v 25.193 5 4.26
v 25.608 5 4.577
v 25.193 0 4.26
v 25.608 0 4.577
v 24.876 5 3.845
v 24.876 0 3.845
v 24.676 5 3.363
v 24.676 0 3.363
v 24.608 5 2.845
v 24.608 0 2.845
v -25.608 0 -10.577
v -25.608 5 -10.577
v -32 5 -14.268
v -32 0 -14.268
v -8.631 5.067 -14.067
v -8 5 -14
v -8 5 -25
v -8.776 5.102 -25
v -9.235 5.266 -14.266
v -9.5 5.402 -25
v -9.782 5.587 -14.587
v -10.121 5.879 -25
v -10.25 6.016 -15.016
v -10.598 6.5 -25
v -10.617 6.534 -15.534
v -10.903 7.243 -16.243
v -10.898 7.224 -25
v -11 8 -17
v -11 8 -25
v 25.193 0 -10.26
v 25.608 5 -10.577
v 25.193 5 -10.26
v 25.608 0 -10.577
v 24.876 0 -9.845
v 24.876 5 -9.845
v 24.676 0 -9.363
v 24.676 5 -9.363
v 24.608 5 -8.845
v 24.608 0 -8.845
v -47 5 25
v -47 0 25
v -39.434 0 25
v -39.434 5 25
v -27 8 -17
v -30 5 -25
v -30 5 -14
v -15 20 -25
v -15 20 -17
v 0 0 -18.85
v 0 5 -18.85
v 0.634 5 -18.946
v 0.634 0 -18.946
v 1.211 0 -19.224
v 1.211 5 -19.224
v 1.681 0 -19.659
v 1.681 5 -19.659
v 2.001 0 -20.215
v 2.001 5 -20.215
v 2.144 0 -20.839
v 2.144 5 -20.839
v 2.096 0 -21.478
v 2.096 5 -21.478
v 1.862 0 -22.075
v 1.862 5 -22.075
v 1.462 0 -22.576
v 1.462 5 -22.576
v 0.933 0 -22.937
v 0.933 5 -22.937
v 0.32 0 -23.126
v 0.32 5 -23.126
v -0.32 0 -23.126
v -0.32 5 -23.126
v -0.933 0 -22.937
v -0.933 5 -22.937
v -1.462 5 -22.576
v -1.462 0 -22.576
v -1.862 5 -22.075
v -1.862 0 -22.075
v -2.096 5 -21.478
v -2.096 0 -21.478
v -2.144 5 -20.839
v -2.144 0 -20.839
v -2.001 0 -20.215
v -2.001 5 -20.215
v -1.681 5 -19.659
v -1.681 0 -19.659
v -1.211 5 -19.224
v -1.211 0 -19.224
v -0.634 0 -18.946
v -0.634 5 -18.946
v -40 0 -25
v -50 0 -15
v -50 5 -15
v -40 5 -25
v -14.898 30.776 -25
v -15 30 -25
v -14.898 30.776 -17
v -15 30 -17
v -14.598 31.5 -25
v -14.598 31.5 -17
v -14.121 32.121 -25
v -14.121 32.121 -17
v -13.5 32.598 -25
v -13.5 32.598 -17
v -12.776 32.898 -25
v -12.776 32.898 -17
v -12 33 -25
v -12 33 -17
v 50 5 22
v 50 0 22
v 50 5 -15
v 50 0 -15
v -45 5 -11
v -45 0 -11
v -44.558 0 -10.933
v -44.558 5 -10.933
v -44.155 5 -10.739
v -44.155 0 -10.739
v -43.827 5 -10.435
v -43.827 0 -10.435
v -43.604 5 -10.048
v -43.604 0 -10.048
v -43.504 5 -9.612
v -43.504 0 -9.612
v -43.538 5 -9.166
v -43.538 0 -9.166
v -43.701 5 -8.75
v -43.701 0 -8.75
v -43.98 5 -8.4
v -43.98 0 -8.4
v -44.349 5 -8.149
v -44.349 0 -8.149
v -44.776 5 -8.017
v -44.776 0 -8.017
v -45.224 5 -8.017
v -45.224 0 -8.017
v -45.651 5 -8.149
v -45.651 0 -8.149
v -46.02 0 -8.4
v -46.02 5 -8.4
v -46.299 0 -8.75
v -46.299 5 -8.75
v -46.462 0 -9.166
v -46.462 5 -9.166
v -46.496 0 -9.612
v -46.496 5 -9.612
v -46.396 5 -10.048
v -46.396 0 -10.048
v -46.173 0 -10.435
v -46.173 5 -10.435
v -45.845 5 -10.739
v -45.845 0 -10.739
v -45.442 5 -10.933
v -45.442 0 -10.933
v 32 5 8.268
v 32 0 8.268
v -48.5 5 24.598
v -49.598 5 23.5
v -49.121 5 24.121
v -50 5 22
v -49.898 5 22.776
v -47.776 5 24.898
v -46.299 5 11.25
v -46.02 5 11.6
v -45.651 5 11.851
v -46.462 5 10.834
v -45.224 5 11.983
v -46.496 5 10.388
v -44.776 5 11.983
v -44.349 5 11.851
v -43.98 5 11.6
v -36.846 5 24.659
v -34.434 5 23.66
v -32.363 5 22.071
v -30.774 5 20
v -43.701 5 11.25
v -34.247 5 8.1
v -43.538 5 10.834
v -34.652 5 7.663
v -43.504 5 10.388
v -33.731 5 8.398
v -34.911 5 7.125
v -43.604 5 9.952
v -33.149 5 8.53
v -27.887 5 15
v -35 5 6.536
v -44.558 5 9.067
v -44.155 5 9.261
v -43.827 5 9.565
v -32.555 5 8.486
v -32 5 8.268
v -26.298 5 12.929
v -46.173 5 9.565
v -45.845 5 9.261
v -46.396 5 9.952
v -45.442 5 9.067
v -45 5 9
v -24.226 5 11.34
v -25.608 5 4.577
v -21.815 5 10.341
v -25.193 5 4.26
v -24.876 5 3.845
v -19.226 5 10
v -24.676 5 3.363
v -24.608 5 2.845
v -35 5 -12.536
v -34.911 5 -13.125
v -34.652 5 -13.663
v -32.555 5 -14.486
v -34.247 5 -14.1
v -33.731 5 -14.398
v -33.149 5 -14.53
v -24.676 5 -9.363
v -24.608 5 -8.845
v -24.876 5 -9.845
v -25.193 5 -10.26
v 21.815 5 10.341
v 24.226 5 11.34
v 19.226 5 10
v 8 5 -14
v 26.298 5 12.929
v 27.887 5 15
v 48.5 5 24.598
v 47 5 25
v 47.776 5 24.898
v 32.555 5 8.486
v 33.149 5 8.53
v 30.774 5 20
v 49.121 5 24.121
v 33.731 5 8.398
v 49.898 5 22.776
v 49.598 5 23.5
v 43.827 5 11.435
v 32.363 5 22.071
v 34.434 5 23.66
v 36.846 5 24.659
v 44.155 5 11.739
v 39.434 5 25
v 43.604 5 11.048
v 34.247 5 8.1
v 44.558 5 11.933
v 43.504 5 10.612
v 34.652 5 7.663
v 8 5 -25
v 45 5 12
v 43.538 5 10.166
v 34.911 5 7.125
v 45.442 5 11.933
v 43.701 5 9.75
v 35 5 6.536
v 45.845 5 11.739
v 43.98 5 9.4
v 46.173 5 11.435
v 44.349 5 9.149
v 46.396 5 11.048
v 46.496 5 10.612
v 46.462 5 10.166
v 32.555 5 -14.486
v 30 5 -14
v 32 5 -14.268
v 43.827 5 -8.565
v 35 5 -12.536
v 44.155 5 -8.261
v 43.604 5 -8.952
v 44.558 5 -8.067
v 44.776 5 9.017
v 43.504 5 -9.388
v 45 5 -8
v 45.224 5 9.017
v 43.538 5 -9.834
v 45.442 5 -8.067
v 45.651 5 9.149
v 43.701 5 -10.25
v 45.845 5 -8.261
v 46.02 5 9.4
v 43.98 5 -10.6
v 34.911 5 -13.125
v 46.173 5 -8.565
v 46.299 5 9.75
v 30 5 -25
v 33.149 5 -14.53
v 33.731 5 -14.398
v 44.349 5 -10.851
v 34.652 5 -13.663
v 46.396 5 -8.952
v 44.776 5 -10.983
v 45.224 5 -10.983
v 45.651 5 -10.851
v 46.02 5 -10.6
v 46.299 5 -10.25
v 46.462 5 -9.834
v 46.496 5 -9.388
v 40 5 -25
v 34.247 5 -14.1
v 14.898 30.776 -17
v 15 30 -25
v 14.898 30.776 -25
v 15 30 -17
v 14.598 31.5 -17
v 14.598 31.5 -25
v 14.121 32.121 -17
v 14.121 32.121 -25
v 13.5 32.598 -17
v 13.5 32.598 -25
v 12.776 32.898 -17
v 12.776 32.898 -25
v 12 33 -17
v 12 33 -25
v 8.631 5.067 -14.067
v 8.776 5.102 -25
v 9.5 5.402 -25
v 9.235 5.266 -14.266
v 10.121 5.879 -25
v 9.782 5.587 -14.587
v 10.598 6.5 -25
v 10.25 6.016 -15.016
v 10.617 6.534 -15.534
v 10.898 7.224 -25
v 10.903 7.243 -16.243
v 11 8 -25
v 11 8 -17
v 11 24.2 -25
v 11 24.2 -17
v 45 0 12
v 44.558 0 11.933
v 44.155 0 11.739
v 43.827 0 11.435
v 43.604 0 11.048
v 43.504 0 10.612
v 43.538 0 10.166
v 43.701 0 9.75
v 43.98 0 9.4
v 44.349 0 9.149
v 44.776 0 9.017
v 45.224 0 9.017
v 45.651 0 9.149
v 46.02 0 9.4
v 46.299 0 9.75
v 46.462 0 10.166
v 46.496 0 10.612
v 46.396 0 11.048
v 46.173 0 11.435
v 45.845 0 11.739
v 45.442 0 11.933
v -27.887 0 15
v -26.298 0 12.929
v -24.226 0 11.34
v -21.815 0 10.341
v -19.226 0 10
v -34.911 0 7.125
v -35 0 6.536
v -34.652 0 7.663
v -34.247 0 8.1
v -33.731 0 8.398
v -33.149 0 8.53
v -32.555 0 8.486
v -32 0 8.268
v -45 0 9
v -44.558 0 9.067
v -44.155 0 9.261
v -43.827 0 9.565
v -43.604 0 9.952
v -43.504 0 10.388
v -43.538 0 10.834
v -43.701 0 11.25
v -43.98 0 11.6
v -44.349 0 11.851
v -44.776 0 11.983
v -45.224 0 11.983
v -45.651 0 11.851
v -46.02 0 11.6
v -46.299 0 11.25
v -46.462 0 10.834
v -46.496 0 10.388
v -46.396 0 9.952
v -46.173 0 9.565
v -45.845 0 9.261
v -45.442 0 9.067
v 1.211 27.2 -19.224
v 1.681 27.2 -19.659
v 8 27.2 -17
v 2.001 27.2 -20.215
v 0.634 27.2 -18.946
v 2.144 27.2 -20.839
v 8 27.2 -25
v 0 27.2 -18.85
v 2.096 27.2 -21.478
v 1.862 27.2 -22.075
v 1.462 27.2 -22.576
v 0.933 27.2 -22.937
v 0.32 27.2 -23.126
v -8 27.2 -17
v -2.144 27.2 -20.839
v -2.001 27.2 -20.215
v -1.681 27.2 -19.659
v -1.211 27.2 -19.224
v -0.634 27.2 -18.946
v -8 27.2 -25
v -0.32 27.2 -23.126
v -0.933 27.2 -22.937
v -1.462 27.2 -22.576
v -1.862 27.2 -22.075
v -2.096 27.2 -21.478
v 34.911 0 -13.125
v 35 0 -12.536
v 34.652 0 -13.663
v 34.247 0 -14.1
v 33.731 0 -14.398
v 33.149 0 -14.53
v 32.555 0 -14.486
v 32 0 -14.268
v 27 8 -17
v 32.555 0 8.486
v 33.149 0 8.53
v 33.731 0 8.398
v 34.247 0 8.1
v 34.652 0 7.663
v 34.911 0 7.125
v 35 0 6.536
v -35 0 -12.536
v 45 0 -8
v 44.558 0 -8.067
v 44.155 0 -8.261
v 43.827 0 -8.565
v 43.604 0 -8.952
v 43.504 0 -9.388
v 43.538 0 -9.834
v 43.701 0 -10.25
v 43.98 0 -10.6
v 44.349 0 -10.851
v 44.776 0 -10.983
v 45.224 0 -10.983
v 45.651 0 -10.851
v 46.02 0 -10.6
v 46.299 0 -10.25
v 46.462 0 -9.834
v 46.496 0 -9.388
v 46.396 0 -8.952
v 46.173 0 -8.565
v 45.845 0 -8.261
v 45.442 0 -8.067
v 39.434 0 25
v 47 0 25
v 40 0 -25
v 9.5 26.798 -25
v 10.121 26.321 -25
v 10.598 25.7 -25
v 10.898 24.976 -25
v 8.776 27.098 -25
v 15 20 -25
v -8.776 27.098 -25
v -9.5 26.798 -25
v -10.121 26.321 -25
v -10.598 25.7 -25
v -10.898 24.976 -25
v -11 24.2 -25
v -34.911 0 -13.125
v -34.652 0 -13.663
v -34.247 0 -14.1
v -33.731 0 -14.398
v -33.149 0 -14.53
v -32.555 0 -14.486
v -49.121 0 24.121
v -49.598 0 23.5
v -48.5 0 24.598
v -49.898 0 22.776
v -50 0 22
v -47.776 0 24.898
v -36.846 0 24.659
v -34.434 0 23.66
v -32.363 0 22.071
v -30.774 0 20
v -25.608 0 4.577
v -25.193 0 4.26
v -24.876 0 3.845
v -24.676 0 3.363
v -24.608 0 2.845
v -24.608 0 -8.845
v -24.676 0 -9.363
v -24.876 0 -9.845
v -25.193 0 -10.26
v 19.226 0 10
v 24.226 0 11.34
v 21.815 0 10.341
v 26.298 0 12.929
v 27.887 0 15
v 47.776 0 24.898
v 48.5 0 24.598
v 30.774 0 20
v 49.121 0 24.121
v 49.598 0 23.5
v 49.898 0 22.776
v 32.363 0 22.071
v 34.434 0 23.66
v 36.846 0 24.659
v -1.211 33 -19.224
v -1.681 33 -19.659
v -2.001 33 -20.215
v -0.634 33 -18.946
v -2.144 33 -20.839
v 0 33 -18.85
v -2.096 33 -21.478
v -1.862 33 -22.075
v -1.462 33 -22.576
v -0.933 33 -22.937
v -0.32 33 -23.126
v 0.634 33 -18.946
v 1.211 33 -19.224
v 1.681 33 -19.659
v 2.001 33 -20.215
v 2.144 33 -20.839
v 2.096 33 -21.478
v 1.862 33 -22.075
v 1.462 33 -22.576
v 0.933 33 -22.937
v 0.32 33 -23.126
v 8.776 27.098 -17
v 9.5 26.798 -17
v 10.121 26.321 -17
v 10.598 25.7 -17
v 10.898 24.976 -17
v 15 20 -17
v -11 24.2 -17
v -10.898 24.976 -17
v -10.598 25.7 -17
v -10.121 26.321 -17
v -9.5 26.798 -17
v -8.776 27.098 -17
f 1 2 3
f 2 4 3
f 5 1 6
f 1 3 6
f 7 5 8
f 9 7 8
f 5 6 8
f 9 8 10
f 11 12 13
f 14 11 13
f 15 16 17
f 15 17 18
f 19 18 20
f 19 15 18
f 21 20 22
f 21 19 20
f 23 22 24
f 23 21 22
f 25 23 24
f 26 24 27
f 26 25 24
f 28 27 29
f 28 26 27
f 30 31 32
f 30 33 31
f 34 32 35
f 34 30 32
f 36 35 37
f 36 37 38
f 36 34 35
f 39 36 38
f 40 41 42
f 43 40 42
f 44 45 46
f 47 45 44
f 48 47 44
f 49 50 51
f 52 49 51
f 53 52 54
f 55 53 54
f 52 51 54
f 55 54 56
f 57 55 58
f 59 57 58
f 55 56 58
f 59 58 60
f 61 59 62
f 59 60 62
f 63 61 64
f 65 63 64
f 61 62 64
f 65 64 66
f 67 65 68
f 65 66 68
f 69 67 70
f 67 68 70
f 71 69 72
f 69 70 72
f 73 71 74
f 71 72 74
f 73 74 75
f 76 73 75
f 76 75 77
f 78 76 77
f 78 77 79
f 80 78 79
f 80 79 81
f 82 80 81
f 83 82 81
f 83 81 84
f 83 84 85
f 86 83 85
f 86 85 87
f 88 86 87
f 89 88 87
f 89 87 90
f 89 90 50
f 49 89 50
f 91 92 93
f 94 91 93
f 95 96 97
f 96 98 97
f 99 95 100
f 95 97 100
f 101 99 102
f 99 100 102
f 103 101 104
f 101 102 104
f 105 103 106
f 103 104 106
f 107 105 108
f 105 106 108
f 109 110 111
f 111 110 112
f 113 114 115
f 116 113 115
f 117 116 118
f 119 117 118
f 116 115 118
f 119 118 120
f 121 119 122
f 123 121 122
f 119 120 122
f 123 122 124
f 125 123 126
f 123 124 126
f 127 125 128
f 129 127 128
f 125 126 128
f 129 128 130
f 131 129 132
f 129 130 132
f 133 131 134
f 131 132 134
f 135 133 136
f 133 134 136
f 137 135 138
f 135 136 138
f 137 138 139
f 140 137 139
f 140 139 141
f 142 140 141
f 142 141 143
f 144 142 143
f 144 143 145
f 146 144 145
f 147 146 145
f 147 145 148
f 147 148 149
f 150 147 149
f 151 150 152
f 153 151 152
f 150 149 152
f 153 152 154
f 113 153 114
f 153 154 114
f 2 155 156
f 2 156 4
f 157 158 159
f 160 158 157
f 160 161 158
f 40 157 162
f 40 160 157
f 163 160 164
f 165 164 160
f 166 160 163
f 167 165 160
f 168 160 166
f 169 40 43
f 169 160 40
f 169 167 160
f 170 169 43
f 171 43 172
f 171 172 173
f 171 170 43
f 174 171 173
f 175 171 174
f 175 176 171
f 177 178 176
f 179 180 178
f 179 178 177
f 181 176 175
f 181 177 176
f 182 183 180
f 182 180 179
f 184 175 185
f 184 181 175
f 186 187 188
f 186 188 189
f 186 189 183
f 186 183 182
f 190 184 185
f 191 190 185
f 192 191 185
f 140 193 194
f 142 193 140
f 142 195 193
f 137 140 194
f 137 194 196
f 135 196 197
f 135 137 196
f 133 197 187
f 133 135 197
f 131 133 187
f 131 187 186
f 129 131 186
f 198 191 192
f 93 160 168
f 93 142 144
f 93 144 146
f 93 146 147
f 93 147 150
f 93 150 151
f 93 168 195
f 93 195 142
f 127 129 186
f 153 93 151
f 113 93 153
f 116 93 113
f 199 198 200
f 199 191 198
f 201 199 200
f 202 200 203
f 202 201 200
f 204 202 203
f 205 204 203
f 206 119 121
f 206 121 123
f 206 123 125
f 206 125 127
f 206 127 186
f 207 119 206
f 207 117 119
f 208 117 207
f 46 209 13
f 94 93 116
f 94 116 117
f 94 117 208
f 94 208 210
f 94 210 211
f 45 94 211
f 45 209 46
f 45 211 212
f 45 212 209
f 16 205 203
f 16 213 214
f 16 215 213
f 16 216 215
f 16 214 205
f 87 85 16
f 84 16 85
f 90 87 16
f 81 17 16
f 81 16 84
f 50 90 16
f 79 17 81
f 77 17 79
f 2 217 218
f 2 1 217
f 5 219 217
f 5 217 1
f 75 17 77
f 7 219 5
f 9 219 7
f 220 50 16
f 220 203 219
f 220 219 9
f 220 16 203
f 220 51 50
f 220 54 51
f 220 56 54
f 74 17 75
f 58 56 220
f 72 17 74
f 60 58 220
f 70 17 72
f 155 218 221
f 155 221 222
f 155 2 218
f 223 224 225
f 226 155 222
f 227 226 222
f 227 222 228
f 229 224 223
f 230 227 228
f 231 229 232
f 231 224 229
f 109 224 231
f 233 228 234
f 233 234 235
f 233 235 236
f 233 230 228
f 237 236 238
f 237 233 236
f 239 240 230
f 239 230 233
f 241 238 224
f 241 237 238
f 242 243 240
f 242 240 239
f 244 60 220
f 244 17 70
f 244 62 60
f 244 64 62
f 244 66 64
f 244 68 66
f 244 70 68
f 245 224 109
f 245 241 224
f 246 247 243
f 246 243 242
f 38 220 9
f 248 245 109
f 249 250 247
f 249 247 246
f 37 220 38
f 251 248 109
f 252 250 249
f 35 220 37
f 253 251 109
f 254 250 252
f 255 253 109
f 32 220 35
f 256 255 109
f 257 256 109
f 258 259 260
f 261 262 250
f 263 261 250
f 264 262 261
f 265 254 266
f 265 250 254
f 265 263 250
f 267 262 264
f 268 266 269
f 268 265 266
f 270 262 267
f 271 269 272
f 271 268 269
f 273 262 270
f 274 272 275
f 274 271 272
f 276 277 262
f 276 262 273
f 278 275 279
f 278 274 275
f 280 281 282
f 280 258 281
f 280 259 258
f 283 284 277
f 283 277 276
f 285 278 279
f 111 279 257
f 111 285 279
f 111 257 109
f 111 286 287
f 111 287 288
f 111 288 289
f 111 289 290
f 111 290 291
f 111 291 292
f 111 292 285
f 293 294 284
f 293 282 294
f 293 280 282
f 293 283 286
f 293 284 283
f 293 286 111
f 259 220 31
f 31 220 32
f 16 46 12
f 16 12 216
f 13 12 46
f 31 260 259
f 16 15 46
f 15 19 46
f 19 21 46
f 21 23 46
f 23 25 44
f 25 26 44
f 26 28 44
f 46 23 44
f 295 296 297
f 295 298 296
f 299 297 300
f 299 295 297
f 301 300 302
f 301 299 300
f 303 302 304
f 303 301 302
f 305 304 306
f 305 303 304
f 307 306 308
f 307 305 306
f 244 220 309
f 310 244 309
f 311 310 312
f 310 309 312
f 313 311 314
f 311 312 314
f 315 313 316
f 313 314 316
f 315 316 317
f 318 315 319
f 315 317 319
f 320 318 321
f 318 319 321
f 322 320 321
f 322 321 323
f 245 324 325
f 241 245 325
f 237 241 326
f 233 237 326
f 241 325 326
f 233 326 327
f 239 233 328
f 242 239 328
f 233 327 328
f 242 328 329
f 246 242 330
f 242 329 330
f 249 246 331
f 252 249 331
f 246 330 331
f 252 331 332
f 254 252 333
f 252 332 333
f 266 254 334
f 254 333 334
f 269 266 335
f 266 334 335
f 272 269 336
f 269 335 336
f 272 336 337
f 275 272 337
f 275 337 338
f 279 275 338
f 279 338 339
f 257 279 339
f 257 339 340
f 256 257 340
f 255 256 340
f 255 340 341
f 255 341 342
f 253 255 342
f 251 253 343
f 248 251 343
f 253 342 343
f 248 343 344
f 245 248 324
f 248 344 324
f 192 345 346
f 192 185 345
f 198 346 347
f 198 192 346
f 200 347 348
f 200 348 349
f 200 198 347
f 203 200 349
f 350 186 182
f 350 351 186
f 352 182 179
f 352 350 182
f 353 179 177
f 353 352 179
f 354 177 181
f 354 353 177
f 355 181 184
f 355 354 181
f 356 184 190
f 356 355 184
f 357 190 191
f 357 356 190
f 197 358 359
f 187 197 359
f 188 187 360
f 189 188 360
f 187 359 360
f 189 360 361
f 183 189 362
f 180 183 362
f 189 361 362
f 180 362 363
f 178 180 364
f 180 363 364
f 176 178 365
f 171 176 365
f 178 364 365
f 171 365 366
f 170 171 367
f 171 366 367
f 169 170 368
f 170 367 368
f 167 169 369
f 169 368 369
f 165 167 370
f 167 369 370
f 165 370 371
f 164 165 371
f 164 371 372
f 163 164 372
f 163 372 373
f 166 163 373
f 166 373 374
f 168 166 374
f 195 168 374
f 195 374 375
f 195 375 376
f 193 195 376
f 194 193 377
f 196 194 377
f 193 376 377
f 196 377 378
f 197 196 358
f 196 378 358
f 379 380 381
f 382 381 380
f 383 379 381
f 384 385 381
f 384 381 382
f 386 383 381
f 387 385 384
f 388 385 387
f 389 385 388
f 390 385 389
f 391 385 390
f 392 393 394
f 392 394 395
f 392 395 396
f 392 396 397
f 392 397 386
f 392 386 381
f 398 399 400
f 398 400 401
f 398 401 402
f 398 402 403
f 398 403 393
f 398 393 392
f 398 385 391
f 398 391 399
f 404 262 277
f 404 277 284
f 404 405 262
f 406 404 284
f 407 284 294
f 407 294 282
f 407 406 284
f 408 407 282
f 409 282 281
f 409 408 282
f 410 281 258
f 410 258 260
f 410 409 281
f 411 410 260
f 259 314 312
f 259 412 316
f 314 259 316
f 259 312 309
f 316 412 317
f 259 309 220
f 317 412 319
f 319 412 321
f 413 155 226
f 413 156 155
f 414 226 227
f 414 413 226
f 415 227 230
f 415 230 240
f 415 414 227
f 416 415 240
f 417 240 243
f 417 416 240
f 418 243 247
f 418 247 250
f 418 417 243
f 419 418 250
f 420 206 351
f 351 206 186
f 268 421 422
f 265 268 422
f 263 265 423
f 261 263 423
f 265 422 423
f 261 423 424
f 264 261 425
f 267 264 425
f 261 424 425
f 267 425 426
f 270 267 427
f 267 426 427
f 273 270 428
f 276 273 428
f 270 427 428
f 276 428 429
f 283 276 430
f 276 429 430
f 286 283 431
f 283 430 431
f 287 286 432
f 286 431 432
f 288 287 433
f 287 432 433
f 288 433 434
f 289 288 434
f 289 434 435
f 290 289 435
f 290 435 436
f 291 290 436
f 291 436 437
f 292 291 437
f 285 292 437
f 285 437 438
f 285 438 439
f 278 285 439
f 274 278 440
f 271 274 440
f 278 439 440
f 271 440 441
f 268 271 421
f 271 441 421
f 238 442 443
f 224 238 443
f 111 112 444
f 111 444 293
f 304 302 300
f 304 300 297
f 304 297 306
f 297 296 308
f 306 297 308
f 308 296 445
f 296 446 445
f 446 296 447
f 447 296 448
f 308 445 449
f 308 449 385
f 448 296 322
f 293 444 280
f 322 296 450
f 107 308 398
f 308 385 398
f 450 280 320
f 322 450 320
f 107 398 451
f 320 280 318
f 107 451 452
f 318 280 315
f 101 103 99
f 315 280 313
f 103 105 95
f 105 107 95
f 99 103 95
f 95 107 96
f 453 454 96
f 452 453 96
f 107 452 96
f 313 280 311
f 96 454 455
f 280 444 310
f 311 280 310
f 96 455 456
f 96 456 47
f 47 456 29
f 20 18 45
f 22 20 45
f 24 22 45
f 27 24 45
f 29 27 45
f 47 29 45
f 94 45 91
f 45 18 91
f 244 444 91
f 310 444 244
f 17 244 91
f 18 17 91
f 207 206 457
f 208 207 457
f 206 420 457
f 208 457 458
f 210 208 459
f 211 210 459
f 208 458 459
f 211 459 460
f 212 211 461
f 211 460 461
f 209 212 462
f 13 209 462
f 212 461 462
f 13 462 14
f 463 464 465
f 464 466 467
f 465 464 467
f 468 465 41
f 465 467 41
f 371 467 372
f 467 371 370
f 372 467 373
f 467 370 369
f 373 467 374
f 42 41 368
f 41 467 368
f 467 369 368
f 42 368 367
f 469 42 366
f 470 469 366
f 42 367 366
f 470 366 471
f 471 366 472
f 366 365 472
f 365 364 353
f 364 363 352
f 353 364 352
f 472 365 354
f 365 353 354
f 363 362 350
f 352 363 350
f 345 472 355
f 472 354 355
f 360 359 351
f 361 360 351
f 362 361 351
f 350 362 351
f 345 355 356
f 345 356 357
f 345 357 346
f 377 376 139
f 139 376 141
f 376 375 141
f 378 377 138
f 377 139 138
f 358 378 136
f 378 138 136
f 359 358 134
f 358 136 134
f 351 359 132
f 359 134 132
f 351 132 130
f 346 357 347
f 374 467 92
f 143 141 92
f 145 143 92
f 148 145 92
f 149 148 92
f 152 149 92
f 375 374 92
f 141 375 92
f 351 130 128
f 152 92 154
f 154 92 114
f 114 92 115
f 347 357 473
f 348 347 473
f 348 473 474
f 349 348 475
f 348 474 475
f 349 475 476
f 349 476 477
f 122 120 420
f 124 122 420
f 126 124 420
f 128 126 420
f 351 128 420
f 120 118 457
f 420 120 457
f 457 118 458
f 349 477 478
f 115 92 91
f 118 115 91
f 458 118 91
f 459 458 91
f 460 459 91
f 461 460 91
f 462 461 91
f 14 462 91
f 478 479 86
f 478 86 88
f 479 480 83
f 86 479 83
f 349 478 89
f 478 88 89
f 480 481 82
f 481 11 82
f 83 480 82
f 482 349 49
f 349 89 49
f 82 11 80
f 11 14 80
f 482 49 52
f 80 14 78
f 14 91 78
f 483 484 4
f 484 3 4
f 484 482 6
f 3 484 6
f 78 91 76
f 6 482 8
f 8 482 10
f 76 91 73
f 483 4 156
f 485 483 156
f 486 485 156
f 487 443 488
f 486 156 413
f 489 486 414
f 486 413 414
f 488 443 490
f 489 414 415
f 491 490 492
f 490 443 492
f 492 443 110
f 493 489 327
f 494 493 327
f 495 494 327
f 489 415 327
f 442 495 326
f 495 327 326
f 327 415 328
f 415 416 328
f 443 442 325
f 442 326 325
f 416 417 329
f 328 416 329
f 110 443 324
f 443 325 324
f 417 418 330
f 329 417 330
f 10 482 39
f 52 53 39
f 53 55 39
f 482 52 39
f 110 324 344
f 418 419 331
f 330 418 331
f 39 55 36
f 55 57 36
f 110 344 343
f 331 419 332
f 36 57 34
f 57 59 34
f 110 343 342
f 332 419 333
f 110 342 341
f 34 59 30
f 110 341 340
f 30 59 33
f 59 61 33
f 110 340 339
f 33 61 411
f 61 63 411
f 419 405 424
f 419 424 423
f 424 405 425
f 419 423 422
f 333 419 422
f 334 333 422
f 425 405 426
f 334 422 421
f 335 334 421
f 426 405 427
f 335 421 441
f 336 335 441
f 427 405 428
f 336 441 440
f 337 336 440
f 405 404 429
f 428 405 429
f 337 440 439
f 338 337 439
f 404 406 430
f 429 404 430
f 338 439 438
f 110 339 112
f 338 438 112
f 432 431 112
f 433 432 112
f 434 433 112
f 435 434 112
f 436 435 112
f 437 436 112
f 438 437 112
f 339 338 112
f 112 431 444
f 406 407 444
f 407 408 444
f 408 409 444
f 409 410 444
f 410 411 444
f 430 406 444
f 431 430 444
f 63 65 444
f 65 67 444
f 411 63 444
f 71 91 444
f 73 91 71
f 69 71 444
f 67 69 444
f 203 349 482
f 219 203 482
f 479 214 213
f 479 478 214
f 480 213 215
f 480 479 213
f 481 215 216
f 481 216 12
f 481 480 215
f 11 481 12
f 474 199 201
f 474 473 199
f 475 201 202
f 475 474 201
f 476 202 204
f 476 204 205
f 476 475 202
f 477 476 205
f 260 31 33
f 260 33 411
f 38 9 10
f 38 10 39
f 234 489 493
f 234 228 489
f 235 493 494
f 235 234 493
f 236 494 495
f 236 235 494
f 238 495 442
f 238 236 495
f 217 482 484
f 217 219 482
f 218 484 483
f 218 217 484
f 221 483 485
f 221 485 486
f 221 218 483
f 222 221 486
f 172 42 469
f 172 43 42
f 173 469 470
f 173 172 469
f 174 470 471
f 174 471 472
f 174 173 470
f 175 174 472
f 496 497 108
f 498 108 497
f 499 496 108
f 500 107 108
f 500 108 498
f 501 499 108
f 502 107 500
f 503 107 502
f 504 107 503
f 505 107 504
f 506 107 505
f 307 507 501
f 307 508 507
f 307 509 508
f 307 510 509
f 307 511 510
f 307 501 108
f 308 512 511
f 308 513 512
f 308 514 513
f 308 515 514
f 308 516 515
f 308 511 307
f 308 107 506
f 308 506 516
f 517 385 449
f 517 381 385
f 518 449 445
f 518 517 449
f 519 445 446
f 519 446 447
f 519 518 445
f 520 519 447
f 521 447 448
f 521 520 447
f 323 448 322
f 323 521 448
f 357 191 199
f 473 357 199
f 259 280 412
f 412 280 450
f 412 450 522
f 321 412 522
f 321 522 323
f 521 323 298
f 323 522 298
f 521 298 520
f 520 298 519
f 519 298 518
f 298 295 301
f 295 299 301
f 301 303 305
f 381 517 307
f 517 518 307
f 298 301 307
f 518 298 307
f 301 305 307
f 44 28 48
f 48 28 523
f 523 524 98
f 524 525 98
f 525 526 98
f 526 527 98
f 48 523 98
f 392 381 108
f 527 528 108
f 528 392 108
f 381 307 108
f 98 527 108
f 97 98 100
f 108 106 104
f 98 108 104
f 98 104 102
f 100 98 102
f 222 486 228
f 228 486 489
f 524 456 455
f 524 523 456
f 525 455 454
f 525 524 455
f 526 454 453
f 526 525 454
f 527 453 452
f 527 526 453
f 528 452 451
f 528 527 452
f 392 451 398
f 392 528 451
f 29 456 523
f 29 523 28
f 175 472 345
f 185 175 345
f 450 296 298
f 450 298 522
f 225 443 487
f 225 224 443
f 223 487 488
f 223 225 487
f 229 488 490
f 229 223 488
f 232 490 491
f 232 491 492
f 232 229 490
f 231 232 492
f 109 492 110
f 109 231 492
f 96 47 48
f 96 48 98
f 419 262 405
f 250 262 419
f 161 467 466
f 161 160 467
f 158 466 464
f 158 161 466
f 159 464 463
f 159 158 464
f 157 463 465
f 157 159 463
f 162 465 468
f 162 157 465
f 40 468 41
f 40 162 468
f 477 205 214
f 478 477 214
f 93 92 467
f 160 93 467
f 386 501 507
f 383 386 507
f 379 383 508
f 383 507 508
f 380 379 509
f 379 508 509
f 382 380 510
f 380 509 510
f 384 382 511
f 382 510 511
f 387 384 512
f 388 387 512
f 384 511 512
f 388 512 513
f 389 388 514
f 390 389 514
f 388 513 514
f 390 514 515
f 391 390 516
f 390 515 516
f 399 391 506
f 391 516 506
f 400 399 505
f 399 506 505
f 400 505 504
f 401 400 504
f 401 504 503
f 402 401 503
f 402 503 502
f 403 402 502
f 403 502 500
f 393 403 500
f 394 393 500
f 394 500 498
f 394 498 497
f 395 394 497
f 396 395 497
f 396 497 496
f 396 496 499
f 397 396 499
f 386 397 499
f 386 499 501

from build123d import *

# Parameters (mm, degrees)
EXTRUDE_1_DEPTH     = 5
FILLET_1_R          = 10
EXTRUDE_2_DEPTH     = 8
FILLET_4_R          = 3
SKETCH_3_R          = 1.5
CUT_EXTRUDE_1_DEPTH = 5
CHAMFER_1_SIZE      = 10
FILLET_5_R          = 3
CUT_EXTRUDE_2_DEPTH = 5
FILLET_6_R          = 2
FILLET_7_R          = 2
CHAMFER_2_SIZE      = 15
FILLET_8_R          = 3
SKETCH_6_R          = 2.15
CUT_EXTRUDE_3_DEPTH = 52
CHAMFER_3_SIZE      = 3


with BuildPart() as part:
    # 草图1 → 凸台-拉伸1 (new body)
    with BuildSketch(Plane(origin=(0, 0, 0), x_dir=(1, 0, 0), z_dir=(0, 1, 0))):
        Polygon((-50, -25), (-33.660254038, -25), (-25, -10), (25, -10), (33.660254038, -25), (50, -25), (50, 25), (-50, 25), align=None)
    extrude(amount=EXTRUDE_1_DEPTH)

    # 圆角1
    fillet_1_edges = [part.edges().sort_by_distance(p)[0] for p in [
        (-25, 2.5, 10),
        (-33.660254038, 2.5, 25),
        (33.660254038, 2.5, 25),
        (25, 2.5, 10),
    ]]
    fillet(fillet_1_edges, radius=FILLET_1_R)

    # 草图2 → 凸台-拉伸2 (add)
    with BuildSketch(Plane(origin=(0, 0, -25), x_dir=(-1, 0, 0), z_dir=(0, 0, -1))):
        Polygon((-15, 33), (-15, 5), (-11, 5), (-11, 27.2), (0, 27.2), (11, 27.2), (11, 5), (15, 5), (15, 33), align=None)
    extrude(amount=-EXTRUDE_2_DEPTH)

    # 圆角4
    fillet_4_edges = [part.edges().sort_by_distance(p)[0] for p in [
        (15, 33, -21),
        (-15, 33, -21),
    ]]
    fillet(fillet_4_edges, radius=FILLET_4_R)

    # 草图3 → 切除-拉伸1 (cut)
    with BuildSketch(Plane.XZ):
        with Locations(Location((-45, 10.5, 0), (0, 0, 270))):
            Circle(SKETCH_3_R)
        with Locations(Location((-45, -9.5, 0), (0, 0, 270))):
            Circle(SKETCH_3_R)
        with Locations(Location((45, -9.5, 0), (0, 0, 90))):
            Circle(SKETCH_3_R)
        with Locations(Location((45, 10.5, 0), (0, 0, 90))):
            Circle(SKETCH_3_R)
    extrude(amount=-CUT_EXTRUDE_1_DEPTH, mode=Mode.SUBTRACT)

    # 倒角1
    chamfer_1_edges = [part.edges().sort_by_distance(p)[0] for p in [
        (-50, 2.5, -25),
        (50, 2.5, -25),
    ]]
    chamfer(chamfer_1_edges, length=CHAMFER_1_SIZE)

    # 圆角5
    fillet_5_edges = [part.edges().sort_by_distance(p)[0] for p in [
        (-50, 2.5, 25),
        (50, 2.5, 25),
    ]]
    fillet(fillet_5_edges, radius=FILLET_5_R)

    # 草图4 → 切除-拉伸2 (cut)
    with BuildSketch(Plane(origin=(0, 5, 0), x_dir=(1, 0, 0), z_dir=(0, 1, 0))):
        Polygon((-35, 16), (-35, -10), (-24.607695155, -4), (-24.607695155, 10), align=None)
        Polygon((24.607695155, -4), (24.607695155, 10), (35, 16), (35, -10), align=None)
    extrude(amount=-CUT_EXTRUDE_2_DEPTH, mode=Mode.SUBTRACT)

    # 圆角6
    fillet_6_edges = [part.edges().sort_by_distance(p)[0] for p in [
        (-35, 2.5, -16),
        (-24.607695155, 2.5, -10),
        (-24.607695155, 2.5, 4),
        (-35, 2.5, 10),
    ]]
    fillet(fillet_6_edges, radius=FILLET_6_R)

    # 圆角7
    fillet_7_edges = [part.edges().sort_by_distance(p)[0] for p in [
        (35, 2.5, 10),
        (24.607695155, 2.5, 4),
        (24.607695155, 2.5, -10),
        (35, 2.5, -16),
    ]]
    fillet(fillet_7_edges, radius=FILLET_7_R)

    # 倒角2
    chamfer_2_edges = [part.edges().sort_by_distance(p)[0] for p in [
        (15, 5, -21),
        (-15, 5, -21),
    ]]
    chamfer(chamfer_2_edges, length=CHAMFER_2_SIZE)

    # 圆角8
    fillet_8_edges = [part.edges().sort_by_distance(p)[0] for p in [
        (-11, 5, -21),
        (-11, 27.2, -21),
        (11, 27.2, -21),
        (11, 5, -21),
    ]]
    fillet(fillet_8_edges, radius=FILLET_8_R)

    # 草图6 → 切除-拉伸3 (cut)
    with BuildSketch(Plane(origin=(0, 33, 0), x_dir=(1, 0, 0), z_dir=(0, 1, 0))):
        with Locations(Location((0, 21, 0), (0, 0, 270))):
            Circle(SKETCH_6_R)
    extrude(amount=-CUT_EXTRUDE_3_DEPTH, mode=Mode.SUBTRACT)

    # 倒角3
    chamfer_3_edges = [part.edges().sort_by_distance(p)[0] for p in [
        (19, 5, -17),
        (-19, 5, -17),
    ]]
    chamfer(chamfer_3_edges, length=CHAMFER_3_SIZE)


solid = part.part
